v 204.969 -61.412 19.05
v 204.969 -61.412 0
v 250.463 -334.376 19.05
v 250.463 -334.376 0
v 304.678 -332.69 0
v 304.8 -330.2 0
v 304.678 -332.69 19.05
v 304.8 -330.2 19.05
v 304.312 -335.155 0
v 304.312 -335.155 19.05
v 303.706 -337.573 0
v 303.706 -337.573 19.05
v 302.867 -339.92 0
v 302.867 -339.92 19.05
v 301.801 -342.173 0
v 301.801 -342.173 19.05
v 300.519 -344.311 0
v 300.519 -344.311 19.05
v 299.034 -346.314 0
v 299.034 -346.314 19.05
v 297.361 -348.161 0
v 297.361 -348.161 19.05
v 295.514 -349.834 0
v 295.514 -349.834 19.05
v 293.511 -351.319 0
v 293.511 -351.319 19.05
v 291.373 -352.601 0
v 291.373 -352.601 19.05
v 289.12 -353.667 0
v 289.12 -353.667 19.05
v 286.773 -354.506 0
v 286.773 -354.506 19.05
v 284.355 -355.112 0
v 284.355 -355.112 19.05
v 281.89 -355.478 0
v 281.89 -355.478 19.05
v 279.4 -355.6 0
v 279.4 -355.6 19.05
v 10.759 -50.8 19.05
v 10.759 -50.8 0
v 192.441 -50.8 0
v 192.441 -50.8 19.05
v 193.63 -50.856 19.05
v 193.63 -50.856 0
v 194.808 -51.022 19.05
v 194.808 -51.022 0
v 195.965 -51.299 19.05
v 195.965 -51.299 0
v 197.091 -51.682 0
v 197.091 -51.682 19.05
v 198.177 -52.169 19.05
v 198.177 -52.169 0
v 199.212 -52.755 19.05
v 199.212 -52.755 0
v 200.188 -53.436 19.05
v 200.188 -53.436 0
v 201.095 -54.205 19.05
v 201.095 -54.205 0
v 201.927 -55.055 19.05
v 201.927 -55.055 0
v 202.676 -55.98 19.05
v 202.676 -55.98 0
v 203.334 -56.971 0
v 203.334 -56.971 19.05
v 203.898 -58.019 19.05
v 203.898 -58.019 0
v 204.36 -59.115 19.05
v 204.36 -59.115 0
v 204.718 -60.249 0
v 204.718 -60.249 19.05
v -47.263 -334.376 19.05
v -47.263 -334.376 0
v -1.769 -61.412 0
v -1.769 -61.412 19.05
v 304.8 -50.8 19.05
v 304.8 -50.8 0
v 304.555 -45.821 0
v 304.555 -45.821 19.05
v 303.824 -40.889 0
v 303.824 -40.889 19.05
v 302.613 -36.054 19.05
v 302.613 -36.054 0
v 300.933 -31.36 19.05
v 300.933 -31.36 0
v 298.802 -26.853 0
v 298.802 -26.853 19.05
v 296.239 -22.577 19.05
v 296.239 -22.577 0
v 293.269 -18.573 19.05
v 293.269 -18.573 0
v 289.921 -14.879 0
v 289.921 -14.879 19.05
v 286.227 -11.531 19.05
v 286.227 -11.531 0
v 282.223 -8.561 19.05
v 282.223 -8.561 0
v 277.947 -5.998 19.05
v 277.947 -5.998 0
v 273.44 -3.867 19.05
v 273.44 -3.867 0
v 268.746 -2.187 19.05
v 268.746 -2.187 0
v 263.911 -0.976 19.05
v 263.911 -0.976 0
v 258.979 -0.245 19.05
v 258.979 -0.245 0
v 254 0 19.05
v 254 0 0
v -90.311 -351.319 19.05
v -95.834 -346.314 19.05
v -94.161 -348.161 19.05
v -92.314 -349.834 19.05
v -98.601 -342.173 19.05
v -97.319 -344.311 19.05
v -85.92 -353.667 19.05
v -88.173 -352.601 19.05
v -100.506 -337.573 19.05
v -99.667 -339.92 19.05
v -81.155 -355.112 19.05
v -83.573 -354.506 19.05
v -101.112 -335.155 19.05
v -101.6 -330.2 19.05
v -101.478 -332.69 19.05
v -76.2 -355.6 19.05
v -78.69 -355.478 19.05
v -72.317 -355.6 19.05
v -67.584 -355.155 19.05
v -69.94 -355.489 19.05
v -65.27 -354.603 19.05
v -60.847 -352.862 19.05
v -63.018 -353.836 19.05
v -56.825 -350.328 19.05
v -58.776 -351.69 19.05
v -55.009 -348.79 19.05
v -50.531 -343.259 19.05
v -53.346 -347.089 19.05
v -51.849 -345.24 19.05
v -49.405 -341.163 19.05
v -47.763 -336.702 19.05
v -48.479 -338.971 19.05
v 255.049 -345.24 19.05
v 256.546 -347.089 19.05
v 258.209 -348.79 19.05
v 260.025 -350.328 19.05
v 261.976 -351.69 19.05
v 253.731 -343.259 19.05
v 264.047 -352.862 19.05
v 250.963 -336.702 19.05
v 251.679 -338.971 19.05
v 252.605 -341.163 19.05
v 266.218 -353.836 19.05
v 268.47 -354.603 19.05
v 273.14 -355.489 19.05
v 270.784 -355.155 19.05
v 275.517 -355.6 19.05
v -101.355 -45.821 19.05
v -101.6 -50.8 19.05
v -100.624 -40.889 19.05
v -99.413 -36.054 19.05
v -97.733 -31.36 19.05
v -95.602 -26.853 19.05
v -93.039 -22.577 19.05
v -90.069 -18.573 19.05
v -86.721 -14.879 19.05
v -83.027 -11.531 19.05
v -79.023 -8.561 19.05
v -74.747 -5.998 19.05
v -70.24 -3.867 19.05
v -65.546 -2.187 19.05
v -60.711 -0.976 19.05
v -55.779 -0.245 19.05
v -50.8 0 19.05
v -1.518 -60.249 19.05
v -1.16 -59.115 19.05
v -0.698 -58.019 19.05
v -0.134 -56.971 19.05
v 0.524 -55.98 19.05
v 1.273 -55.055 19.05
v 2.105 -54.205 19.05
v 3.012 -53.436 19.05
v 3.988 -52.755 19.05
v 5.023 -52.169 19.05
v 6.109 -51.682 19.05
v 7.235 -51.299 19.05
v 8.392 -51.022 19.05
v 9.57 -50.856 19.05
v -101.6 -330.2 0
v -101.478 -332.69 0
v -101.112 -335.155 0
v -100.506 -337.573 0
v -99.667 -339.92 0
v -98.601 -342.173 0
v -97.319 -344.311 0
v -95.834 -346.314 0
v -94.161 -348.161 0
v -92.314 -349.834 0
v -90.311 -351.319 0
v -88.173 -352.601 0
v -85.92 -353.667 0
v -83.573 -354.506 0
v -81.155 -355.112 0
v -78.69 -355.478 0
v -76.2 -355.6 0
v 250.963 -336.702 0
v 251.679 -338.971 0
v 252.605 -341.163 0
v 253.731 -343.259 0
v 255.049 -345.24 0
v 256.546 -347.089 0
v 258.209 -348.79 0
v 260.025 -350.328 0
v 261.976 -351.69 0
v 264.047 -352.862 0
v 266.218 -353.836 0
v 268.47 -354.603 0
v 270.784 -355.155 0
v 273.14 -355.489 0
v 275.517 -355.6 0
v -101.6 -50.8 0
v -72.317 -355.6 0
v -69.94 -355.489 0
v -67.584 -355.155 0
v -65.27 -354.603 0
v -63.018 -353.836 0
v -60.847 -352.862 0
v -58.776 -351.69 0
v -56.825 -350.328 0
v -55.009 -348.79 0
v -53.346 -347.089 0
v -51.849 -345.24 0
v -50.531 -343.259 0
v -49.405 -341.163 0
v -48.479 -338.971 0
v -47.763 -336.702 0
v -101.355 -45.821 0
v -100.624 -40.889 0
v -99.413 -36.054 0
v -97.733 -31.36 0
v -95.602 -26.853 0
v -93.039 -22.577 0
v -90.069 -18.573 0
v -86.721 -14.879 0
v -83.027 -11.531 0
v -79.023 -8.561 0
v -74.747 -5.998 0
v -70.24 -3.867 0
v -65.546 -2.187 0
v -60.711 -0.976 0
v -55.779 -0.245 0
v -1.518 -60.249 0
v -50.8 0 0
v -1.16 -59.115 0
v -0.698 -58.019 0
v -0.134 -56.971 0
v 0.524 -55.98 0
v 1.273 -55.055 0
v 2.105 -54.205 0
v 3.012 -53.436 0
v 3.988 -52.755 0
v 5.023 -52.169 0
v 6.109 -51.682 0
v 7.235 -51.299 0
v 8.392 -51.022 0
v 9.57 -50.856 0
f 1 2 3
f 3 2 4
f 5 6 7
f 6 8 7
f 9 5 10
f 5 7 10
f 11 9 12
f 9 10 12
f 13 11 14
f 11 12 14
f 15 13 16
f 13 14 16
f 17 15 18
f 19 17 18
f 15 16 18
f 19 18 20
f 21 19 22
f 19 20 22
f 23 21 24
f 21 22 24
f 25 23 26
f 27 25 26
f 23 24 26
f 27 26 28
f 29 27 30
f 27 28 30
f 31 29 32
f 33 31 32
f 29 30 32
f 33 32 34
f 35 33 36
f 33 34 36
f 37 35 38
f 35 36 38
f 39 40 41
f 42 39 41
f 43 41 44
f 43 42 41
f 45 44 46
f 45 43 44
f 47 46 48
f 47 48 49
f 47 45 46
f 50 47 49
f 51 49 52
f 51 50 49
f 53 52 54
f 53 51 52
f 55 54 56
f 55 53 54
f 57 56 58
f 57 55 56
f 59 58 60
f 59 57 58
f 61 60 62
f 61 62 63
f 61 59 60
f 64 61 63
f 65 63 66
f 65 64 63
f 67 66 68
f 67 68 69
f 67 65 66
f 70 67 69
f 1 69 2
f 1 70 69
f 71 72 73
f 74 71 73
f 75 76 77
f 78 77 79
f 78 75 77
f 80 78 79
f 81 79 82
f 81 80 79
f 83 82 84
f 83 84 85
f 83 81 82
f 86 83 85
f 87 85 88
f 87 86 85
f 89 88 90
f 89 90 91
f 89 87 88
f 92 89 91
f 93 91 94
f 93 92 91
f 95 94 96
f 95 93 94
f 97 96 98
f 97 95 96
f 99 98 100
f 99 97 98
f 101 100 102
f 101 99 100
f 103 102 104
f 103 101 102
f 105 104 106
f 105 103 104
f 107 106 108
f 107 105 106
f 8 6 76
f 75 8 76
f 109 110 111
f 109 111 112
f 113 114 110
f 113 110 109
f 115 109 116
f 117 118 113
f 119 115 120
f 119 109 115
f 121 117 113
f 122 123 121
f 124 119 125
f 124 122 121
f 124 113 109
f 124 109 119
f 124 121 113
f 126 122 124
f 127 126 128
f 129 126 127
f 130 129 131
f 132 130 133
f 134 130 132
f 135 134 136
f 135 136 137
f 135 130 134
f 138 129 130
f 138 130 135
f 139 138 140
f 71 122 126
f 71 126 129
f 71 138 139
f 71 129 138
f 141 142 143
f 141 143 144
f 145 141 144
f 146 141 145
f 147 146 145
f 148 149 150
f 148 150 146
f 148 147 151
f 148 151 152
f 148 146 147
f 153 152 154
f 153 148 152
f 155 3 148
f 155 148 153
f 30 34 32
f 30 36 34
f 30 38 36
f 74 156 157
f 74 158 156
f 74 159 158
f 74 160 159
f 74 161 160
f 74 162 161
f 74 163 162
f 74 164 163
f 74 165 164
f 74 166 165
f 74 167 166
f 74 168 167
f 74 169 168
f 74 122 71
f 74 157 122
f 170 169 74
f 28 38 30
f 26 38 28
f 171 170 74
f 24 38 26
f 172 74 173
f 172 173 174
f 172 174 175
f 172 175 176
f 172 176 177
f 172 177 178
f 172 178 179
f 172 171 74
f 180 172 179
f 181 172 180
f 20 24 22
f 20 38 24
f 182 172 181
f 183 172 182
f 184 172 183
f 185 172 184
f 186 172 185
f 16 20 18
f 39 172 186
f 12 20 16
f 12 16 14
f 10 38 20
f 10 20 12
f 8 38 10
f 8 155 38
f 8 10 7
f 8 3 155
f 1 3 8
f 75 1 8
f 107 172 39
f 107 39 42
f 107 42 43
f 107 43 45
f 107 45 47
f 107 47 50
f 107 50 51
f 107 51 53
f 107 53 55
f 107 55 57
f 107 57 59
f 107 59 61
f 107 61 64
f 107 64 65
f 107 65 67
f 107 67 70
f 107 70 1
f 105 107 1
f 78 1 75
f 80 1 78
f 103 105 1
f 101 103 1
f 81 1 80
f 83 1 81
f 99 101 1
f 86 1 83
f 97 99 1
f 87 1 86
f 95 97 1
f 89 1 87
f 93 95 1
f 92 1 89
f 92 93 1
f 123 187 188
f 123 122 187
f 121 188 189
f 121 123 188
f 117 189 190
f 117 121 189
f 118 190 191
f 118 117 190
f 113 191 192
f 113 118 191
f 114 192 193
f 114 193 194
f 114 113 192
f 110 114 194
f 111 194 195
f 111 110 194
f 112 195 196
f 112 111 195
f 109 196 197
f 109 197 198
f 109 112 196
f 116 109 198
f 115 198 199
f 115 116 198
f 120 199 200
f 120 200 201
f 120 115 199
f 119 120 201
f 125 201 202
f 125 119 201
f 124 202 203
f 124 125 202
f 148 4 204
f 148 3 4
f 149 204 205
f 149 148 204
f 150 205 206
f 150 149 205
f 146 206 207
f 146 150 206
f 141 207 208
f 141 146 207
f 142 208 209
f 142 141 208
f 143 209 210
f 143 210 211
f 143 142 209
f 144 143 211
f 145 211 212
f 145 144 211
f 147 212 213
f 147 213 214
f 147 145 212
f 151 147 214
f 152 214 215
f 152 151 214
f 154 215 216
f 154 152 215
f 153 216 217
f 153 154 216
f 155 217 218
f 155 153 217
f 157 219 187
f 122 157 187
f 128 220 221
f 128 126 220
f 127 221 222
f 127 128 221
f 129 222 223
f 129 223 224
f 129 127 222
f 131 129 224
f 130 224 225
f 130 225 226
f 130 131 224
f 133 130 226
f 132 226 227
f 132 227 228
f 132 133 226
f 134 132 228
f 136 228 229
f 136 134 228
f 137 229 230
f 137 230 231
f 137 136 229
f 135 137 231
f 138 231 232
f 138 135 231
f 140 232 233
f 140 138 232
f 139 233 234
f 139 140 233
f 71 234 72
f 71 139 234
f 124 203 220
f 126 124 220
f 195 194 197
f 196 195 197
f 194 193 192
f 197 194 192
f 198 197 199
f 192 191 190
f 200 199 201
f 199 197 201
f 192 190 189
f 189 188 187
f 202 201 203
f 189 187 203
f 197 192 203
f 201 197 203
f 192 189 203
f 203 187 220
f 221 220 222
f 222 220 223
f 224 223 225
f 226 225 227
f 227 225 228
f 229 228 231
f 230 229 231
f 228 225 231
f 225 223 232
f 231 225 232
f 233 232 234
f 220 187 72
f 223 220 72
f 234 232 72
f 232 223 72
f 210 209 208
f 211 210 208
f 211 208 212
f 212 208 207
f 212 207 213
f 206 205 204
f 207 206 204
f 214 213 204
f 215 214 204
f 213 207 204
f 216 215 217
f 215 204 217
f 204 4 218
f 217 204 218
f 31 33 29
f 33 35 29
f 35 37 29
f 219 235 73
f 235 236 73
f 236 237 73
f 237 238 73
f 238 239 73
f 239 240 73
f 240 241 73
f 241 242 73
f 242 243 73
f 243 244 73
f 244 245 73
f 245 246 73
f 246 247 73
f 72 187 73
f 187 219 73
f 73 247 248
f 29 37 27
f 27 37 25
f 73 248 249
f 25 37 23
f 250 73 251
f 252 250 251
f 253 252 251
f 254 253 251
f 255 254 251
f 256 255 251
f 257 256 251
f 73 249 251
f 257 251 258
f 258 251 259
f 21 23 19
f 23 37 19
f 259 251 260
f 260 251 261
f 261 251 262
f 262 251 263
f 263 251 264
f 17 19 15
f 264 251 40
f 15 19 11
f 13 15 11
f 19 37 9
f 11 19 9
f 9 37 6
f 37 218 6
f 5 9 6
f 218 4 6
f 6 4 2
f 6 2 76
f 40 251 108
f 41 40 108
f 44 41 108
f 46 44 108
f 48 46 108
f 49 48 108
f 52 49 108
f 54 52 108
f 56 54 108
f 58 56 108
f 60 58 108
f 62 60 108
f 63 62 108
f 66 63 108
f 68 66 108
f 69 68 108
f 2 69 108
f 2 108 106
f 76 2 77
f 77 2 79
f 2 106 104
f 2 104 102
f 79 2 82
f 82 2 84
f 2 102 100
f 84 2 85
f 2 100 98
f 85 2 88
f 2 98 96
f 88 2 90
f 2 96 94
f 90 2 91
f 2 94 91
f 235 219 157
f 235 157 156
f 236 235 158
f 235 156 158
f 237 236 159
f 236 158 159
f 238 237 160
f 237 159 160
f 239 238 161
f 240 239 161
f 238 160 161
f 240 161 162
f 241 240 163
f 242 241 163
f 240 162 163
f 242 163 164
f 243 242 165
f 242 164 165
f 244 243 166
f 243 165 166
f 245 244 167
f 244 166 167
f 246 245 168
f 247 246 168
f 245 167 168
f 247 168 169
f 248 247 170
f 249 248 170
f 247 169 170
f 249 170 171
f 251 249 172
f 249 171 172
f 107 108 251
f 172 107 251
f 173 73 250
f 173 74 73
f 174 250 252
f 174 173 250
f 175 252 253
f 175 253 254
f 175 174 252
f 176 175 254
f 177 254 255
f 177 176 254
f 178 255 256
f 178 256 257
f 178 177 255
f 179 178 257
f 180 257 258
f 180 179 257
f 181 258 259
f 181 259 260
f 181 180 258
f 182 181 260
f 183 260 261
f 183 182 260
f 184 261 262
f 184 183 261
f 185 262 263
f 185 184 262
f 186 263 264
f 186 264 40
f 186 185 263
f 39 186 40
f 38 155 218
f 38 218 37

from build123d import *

# Parameters (mm, degrees)
F1_DEPTH = 19.05
F2_R     = 50.8
F3_R     = 25.4
F4_R     = 12.7


with BuildPart() as f1:
    # F0 (on Top) → F1 (new body)
    with BuildSketch(Plane.XY):
        Polygon((203.2, 0), (0, 0), (-101.6, 0), (-101.6, -355.6), (-50.8, -355.6), (0, -50.8), (203.2, -50.8), (254, -355.6), (304.8, -355.6), (304.8, 0), align=None)
    extrude(amount=F1_DEPTH)

    # F2
    f2_edges = [f1.edges().sort_by_distance(p)[0] for p in [
        (-101.6, 0, 9.525),
        (304.8, 0, 9.525),
    ]]
    fillet(f2_edges, radius=F2_R)

    # F3
    f3_edges = [f1.edges().sort_by_distance(p)[0] for p in [
        (-101.6, -355.6, 9.525),
        (-50.8, -355.6, 9.525),
        (304.8, -355.6, 9.525),
        (254, -355.6, 9.525),
    ]]
    fillet(f3_edges, radius=F3_R)

    # F4
    f4_edges = [f1.edges().sort_by_distance(p)[0] for p in [
        (203.2, -50.8, 9.525),
        (0, -50.8, 9.525),
    ]]
    fillet(f4_edges, radius=F4_R)


solid = f1.part
